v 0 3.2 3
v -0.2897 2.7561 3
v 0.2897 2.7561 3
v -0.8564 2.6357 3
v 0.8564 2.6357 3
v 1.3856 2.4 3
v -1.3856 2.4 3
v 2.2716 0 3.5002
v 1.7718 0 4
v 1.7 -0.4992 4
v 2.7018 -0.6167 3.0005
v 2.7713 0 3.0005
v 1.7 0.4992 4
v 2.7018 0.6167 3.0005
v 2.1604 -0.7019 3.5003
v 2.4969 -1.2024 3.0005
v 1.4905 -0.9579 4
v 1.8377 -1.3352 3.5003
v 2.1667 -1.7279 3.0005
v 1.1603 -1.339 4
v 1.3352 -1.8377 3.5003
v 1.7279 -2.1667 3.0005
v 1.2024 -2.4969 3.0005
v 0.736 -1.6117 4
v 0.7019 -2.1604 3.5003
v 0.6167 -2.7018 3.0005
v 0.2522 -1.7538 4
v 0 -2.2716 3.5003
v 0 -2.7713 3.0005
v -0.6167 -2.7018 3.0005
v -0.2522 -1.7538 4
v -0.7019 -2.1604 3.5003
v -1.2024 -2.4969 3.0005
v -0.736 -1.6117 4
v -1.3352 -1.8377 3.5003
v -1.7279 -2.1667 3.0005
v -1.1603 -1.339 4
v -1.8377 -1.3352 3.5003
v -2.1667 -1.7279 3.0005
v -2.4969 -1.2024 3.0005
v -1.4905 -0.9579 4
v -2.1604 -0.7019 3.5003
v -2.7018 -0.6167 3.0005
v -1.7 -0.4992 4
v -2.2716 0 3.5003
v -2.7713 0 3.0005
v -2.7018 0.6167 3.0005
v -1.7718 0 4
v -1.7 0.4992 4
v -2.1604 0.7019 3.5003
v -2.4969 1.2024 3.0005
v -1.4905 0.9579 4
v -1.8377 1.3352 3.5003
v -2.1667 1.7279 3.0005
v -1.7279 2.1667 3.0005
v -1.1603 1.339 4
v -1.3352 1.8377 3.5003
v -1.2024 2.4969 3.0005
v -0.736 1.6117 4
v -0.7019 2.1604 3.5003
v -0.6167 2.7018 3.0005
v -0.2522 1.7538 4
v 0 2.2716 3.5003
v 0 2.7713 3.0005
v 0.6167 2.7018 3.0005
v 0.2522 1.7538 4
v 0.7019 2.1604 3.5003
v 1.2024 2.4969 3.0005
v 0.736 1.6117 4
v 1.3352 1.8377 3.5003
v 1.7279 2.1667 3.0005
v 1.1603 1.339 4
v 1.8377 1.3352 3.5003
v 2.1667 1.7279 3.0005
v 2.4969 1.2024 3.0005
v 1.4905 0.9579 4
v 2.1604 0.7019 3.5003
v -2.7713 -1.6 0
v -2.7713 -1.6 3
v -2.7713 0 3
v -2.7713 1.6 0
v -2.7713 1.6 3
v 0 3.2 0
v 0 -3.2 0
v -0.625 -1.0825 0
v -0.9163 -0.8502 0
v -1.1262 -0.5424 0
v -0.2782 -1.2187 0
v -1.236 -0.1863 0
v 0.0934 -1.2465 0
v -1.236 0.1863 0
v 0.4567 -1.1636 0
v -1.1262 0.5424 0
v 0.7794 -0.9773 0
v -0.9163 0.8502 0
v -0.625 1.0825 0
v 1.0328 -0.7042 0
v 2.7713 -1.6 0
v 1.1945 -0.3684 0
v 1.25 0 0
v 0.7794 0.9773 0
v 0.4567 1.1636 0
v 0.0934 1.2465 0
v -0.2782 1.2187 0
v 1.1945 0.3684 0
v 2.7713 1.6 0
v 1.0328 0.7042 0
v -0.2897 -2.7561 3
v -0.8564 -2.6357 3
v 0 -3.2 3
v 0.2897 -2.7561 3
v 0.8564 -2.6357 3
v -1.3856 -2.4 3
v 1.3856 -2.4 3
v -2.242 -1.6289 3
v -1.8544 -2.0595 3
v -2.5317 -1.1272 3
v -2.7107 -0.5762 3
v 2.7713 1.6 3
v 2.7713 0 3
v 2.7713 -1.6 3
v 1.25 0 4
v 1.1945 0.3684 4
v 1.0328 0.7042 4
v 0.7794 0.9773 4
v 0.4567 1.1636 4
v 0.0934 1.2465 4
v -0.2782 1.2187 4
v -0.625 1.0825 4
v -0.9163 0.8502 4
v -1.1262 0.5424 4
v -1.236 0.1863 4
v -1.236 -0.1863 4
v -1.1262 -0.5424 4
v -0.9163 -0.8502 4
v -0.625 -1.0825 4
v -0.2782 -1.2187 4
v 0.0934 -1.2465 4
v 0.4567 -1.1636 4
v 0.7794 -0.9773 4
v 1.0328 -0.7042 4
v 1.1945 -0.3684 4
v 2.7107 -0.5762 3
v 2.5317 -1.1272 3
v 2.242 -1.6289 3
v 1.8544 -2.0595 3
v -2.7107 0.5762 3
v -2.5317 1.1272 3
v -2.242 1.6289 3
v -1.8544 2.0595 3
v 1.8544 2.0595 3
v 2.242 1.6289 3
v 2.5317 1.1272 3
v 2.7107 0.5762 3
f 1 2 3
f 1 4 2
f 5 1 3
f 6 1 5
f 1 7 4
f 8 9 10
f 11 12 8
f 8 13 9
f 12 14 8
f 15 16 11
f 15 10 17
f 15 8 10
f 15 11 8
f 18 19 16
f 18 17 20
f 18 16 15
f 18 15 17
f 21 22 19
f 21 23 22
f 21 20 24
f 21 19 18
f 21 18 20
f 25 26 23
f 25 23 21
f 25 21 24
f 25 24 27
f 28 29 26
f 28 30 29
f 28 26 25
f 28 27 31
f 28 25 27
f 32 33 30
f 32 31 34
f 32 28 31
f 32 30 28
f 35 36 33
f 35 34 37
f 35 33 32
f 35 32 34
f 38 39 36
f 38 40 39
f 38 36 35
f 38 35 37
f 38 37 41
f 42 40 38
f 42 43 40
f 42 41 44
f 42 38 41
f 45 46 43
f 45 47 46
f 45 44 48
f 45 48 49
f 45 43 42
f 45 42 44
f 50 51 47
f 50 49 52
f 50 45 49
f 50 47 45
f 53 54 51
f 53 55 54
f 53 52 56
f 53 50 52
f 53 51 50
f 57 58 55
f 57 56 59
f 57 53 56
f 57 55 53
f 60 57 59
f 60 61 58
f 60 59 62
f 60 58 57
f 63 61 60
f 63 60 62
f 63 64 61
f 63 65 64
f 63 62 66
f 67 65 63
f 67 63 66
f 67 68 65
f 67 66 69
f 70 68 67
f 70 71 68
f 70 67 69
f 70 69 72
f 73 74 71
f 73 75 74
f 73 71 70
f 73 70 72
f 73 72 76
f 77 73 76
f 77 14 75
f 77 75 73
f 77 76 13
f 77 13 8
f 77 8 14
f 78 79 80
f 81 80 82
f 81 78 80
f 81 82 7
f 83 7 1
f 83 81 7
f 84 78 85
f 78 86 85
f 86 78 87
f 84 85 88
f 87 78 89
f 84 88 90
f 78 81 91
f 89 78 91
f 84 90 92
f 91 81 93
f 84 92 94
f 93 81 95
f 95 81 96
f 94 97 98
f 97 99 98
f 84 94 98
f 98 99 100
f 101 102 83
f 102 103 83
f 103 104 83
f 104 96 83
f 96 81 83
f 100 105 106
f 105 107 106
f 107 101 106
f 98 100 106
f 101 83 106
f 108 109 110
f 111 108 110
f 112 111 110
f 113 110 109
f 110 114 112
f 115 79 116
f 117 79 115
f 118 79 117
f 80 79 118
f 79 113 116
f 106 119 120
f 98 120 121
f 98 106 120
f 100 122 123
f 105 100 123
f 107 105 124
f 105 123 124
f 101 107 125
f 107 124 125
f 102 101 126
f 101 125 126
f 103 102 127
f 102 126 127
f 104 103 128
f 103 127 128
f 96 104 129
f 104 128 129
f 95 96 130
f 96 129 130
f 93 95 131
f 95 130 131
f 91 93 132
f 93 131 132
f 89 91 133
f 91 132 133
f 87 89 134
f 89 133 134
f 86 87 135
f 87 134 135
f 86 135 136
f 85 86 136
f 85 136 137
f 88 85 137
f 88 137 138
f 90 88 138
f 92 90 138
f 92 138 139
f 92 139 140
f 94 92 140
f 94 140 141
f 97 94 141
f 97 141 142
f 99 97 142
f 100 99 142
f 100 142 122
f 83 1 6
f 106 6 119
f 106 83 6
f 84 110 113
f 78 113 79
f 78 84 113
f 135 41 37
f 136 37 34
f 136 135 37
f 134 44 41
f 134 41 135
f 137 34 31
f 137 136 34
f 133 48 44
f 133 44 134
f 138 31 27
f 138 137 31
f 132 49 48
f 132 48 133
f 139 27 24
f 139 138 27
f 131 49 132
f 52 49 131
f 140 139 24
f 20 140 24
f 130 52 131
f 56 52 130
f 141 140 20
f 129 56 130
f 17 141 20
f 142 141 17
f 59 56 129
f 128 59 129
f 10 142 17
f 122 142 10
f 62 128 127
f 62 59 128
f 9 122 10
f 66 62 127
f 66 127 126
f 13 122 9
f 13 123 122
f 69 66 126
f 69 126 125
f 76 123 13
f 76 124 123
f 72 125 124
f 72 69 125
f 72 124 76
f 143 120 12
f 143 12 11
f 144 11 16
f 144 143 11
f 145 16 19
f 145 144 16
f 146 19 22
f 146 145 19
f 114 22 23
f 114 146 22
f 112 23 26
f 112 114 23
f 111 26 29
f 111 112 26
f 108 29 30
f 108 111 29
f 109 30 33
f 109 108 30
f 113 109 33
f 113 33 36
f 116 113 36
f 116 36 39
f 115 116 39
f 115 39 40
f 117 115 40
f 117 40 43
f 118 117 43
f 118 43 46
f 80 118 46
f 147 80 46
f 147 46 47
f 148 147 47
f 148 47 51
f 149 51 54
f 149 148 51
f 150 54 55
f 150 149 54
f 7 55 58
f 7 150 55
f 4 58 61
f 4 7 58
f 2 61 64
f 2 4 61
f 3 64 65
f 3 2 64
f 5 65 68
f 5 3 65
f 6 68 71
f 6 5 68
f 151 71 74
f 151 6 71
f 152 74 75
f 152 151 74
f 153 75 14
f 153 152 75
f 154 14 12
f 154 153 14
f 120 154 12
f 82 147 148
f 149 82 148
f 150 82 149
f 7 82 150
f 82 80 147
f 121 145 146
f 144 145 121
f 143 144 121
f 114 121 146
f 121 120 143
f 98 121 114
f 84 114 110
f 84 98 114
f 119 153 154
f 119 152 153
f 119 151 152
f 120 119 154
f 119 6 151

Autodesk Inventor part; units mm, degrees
ref_plane "YZ Plane" through (0, 0, 0) normal (1, 0, 0) x (0, 1, 0)
ref_plane "XZ Plane" through (0, 0, 0) normal (0, 1, 0) x (-1, 0, 0)
ref_plane "XY Plane" through (0, 0, 0) normal (0, 0, 1) x (1, 0, 0)
sketch "スケッチ1" plane through (0, 0, 0) normal (0, 0, 1) x (1, 0, 0)
  line L0 (0, -3.2) -> (-2.7713, -1.6)
  line L1 (-2.7713, -1.6) -> (-2.7713, 1.6)
  line L2 (-2.7713, 1.6) -> (0, 3.2)
  line L3 (0, 3.2) -> (2.7713, 1.6)
  line L4 (2.7713, 1.6) -> (2.7713, -1.6)
  line L5 (2.7713, -1.6) -> (0, -3.2)
  circle A0 centre (0, 0) radius 2.7713
  dimension "d0" = 6.4
extrude "押し出し1" add sketch "スケッチ1" along normal blind 3
sketch "スケッチ2" plane through (0, 0, 3) normal (0, 0, 1) x (1, 0, 0)
  line L0 (-2.7713, -1.6) -> (0, -3.2) projected
  line L1 (0, -3.2) -> (2.7713, -1.6) projected
  line L2 (2.7713, -1.6) -> (2.7713, 1.6) projected
  line L3 (2.7713, 1.6) -> (0, 3.2) projected
  line L4 (0, 3.2) -> (-2.7713, 1.6) projected
  line L5 (-2.7713, 1.6) -> (-2.7713, -1.6) projected
  circle A0 centre (0, 0) radius 2.7713
extrude "押し出し2" add sketch "スケッチ2" along normal blind 1 contours A0
chamfer "面取り1" distance 1 angle 45 1 edges at (-2.7713, 0, 4)
sketch "スケッチ3" plane through (0, 0, 4) normal (0, 0, 1) x (1, 0, 0)
  circle A0 centre (0, 0) radius 1.7713 projected
  circle A1 centre (0, 0) radius 1.25
  dimension "d8" = 2.5
extrude "押し出し3" cut sketch "スケッチ3" against normal blind 4 contours A1
thread "ねじ1" size "M2.5x0.45" class "6H" standard "ANSI Metric M Profile" full length
properties part number "ナイロンナット" material "アルミニウム"
